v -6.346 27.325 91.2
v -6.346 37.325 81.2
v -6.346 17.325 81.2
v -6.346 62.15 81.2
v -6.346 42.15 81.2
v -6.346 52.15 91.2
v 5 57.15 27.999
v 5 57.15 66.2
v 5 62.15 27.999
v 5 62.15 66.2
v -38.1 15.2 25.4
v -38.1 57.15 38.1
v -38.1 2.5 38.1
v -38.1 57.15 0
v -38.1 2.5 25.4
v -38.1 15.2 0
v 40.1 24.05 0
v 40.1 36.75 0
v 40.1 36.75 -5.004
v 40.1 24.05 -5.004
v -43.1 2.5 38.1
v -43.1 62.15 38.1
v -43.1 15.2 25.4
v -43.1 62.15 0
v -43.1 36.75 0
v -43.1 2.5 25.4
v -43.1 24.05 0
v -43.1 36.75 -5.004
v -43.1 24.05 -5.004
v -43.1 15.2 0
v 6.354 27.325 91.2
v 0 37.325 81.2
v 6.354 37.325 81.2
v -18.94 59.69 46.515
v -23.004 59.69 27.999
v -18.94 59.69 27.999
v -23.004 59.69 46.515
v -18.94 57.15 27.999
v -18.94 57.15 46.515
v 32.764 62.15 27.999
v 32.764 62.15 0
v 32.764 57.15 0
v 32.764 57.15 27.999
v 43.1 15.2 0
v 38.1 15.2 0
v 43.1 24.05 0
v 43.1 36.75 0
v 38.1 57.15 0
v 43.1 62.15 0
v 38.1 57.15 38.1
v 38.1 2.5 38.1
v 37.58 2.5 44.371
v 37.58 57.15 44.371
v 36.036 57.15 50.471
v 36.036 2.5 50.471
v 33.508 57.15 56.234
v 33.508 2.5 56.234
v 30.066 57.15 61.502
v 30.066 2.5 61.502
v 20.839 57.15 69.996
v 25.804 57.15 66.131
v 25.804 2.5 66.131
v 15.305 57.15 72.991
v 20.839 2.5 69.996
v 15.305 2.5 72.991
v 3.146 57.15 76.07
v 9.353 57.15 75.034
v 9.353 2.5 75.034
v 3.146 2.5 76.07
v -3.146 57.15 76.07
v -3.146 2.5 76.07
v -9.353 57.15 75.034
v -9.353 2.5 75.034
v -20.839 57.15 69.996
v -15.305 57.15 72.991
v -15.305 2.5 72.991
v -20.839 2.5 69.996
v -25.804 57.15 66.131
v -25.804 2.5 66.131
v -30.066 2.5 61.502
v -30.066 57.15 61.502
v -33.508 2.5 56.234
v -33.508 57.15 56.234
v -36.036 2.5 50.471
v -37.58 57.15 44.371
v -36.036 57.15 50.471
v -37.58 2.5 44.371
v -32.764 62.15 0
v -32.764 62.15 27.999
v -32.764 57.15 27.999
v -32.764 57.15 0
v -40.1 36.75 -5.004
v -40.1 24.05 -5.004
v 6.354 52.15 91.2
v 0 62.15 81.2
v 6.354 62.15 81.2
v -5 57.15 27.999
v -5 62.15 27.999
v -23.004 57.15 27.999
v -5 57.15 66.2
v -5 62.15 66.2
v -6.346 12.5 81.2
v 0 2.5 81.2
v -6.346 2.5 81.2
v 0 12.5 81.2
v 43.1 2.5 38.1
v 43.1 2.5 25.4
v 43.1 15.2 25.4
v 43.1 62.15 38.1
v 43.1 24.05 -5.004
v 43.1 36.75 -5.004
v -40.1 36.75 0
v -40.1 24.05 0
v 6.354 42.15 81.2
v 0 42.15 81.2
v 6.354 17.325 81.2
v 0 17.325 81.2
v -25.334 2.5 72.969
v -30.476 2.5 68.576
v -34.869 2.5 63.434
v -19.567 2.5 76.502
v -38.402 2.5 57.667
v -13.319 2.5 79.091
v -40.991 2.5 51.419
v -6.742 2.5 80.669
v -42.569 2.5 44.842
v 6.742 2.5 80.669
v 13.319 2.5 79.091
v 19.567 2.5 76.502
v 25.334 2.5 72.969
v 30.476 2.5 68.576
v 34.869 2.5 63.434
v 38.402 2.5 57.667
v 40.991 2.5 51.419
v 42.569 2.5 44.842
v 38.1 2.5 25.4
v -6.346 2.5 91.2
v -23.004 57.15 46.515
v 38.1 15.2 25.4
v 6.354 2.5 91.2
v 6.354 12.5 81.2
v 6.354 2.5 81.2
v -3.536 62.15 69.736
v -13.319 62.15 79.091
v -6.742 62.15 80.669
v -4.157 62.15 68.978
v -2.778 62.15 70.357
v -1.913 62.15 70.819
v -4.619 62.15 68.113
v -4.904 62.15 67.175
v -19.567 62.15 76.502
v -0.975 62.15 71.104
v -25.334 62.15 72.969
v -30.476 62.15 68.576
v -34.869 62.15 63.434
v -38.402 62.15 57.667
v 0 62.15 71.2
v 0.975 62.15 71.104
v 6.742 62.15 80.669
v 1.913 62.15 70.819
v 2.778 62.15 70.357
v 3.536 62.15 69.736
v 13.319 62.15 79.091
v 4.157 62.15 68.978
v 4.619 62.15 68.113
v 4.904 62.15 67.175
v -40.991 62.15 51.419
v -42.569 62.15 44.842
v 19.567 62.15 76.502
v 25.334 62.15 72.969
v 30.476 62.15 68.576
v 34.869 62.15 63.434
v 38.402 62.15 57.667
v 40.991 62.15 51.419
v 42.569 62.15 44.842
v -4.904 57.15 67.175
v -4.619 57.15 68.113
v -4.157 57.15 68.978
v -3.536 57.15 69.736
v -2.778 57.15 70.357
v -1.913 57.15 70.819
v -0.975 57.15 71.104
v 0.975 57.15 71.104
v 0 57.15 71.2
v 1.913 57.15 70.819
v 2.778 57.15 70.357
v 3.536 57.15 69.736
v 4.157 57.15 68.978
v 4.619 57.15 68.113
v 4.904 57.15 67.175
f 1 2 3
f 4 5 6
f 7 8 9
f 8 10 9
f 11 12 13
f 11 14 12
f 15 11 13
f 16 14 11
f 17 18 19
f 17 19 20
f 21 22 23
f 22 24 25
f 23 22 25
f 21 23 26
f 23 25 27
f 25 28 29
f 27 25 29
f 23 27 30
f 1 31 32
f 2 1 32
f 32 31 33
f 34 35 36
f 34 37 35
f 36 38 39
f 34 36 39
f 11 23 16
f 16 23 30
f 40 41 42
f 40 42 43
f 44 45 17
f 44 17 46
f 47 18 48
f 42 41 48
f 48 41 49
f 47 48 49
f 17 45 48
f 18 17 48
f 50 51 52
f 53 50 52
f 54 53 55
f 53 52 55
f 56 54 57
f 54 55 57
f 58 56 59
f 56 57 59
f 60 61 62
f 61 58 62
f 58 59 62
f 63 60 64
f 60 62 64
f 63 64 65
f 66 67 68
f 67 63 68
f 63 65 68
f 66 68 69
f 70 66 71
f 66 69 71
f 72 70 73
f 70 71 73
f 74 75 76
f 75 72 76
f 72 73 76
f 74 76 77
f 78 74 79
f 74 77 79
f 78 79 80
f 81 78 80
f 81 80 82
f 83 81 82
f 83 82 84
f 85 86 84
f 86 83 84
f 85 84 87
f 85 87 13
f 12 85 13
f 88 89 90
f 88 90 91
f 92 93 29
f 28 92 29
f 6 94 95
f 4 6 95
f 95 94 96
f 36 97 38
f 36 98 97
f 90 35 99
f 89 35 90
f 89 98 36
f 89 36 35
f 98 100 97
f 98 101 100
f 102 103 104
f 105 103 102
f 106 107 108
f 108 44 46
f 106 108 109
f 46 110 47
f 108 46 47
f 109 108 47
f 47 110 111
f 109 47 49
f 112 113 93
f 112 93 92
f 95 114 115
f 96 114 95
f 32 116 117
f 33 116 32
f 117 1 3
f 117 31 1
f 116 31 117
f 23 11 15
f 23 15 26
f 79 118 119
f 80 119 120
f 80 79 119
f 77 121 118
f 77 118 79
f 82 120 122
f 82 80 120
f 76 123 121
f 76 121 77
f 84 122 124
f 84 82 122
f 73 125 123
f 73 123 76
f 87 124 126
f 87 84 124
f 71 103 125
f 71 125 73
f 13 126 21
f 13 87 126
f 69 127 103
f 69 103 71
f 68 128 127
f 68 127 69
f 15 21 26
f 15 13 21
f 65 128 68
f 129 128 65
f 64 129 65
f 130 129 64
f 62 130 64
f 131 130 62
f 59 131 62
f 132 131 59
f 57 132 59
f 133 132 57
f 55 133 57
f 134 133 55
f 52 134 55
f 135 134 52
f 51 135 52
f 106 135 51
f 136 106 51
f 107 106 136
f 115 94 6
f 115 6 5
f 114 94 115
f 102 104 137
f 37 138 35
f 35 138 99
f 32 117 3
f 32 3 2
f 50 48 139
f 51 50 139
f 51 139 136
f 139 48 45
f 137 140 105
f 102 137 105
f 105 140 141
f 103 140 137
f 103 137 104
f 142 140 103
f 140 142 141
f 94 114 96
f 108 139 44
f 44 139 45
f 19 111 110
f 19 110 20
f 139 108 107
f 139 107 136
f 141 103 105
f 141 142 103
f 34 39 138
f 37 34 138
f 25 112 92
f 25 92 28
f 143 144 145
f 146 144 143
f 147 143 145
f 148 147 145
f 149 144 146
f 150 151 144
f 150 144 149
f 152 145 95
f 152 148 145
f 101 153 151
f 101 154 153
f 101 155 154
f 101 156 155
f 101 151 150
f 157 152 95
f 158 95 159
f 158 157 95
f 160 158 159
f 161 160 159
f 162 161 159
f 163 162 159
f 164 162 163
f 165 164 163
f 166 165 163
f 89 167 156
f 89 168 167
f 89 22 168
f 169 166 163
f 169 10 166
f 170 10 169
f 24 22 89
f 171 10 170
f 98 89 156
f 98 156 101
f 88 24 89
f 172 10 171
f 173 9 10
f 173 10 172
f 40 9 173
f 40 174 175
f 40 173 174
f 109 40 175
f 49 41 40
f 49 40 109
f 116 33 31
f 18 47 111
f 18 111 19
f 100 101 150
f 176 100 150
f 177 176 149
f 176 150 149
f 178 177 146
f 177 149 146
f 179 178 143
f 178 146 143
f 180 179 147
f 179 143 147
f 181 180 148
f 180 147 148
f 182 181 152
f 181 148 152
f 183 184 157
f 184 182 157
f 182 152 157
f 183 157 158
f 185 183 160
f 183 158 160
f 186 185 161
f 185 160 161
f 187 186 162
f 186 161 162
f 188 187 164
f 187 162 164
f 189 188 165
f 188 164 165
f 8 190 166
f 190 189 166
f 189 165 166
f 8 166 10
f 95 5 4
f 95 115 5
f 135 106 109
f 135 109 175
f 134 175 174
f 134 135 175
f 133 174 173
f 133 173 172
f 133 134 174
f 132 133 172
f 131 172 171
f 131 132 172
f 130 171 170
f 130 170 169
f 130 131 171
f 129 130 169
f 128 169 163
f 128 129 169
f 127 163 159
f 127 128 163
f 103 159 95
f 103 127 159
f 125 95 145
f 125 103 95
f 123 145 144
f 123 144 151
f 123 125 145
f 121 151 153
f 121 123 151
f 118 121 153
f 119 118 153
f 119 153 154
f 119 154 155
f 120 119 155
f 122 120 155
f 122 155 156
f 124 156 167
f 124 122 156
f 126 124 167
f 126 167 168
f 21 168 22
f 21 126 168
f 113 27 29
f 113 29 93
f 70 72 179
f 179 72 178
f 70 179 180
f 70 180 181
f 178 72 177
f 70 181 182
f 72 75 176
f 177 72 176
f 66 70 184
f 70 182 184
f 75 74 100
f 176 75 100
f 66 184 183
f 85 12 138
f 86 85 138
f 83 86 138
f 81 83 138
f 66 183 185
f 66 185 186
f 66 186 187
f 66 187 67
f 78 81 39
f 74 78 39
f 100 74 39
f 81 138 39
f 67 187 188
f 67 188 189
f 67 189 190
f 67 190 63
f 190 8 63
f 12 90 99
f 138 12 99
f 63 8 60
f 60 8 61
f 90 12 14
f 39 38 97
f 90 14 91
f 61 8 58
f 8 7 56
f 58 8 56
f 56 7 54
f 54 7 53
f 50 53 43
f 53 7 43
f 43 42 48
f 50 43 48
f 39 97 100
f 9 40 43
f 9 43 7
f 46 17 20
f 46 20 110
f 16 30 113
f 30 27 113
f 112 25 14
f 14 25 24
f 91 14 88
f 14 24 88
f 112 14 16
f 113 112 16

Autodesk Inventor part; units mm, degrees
ref_plane "YZ Plane" through (0, 0, 0) normal (1, 0, 0) x (0, 1, 0)
ref_plane "XZ Plane" through (0, 0, 0) normal (0, 1, 0) x (-1, 0, 0)
sketch "Sketch1" plane through (0, 0, 0) normal (0, 0, 1) x (1, 0, 0)
  arc A0 (-38.1, -57.15) -> (38.1, -57.15) centre (0, -57.15) ccw projected
  line L0 (38.1, -57.15) -> (43.1, -57.15) projected
  line L1 (43.1, -57.15) -> (43.1, 62.15) projected
  line L2 (43.1, 62.15) -> (-43.1, 62.15) projected
  line L3 (-43.1, 62.15) -> (-43.1, -57.15) projected
  line L4 (-43.1, -57.15) -> (-38.1, -57.15) projected
  line L5 (14, 57.15) -> (-14, 57.15) projected
  line L6 (14, 57.15) -> (14, 54.15) projected
  line L7 (14, 54.15) -> (-10.002, 54.15) projected
  line L8 (-10.002, 54.15) -> (-10.002, 53.078) projected
  line L9 (-10.002, 53.078) -> (-14, 53.078) projected
  line L10 (-14, 53.078) -> (-14, 57.15) projected
  line L11 (10.16, -7.55) -> (-10.16, -7.55) projected
  line L12 (-10.16, -7.55) -> (-10.16, 9.15) projected
  line L13 (-10.16, 9.15) -> (10.16, 9.15) projected
  line L14 (10.16, 9.15) -> (10.16, -7.55) projected
  circle A1 centre (0, -77.15) radius 5 projected
  line L15 (-19.058, -20.782) -> (-19.058, -16.21) projected
  line L16 (-19.058, -16.21) -> (-17.058, -16.21) projected
  line L17 (-17.058, -16.21) -> (-17.058, -22.782) projected
  line L18 (-17.058, -22.782) -> (-24.598, -22.782) projected
  line L19 (-24.598, -22.782) -> (-24.598, -16.21) projected
  line L20 (-24.598, -16.21) -> (-22.598, -16.21) projected
  line L21 (-22.598, -16.21) -> (-22.598, -20.782) projected
  line L22 (-22.598, -20.782) -> (-19.058, -20.782) projected
  line L23 (-19.058, 7.65) -> (-19.058, 12.222) projected
  line L24 (-19.058, 12.222) -> (-22.598, 12.222) projected
  line L25 (-22.598, 12.222) -> (-22.598, 7.65) projected
  line L26 (-22.598, 7.65) -> (-24.598, 7.65) projected
  line L27 (-24.598, 7.65) -> (-24.598, 14.222) projected
  line L28 (-24.598, 14.222) -> (-17.058, 14.222) projected
  line L29 (-17.058, 14.222) -> (-17.058, 7.65) projected
  line L30 (-17.058, 7.65) -> (-19.058, 7.65) projected
  line L31 (-6.662, 29.218) -> (-6.662, 22.4) projected
  line L32 (-6.662, 22.4) -> (7.275, 22.4) projected
  line L33 (7.275, 22.4) -> (7.275, 19.4) projected
  line L34 (7.275, 19.4) -> (-14.202, 19.4) projected
  line L35 (-14.202, 19.4) -> (-14.202, 29.218) projected
  line L36 (-14.202, 29.218) -> (-12.202, 29.218) projected
  line L37 (-12.202, 29.218) -> (-12.202, 29.221) projected
  line L38 (-12.202, 29.221) -> (-8.662, 29.221) projected
  line L39 (-8.662, 29.221) -> (-8.662, 29.218) projected
  line L40 (-8.662, 29.218) -> (-6.662, 29.218) projected
  line L41 (38.1, -57.15) -> (43.1, -57.15)
  line L42 (43.1, -57.15) -> (43.1, 62.15)
  line L43 (43.1, 62.15) -> (38.1, 62.15)
  line L44 (38.1, 62.15) -> (38.1, -57.15)
  line L45 (-38.1, -57.15) -> (-43.1, -57.15)
  line L46 (-43.1, -57.15) -> (-43.1, 62.15)
  line L47 (-43.1, 62.15) -> (-38.1, 62.15)
  line L48 (-38.1, 62.15) -> (-38.1, -57.15)
  line L49 (-43.1, 62.15) -> (-43.1, 57.15)
  line L50 (-43.1, 57.15) -> (43.1, 57.15)
  line L51 (43.1, 57.15) -> (-43.1, 57.15)
  line L52 (-43.1, 57.15) -> (-43.1, 62.15)
  line L53 (-43.1, 62.15) -> (43.1, 62.15)
  line L54 (43.1, 62.15) -> (43.1, 57.15)
  point P0 (0, 0)
  dimension "d0" = 5
extrude "Extrusion1" add sketch "Sketch1" along normal blind 38.1 contours L4 L3 L50 L48 | L44 L50 L1 L0 | L50 L3 L2 L48 | L48 L2 L44 L50 L5 | L44 L2 L1 L50
sketch "Sketch2" plane through (-43.1, -57.15, 0) normal (0, -1, 0) x (1, 0, 0)
  line L0 (5, 38.1) -> (81.2, 38.1) projected
  arc A0 (81.2, 38.1) -> (5, 38.1) centre (43.1, 38.1) ccw
  line L1 (0, 38.1) -> (5, 38.1) projected
  arc A1 (86.2, 38.1) -> (0, 38.1) centre (43.1, 38.1) ccw
  line L2 (0, 38.1) -> (5, 38.1)
  line L3 (81.2, 38.1) -> (86.2, 38.1) projected
  line L4 (81.2, 38.1) -> (86.2, 38.1)
  point P0 (43.1, 0)
extrude "Extrusion2" add sketch "Sketch2" against normal blind 119.3 contours L1 A1 L3 A0
sketch "Sketch3" plane through (-43.1, 62.15, 0) normal (0, 1, 0) x (1, 0, 0)
  arc A0 (5, -38.1) -> (81.2, -38.1) centre (43.1, -38.1) ccw projected
  line L0 (81.2, -38.1) -> (5, -38.1) projected
  point P0 (43.1, 0)
extrude "Extrusion3" add sketch "Sketch3" against normal blind 5
sketch "Sketch4" plane through (-43.1, 62.15, 0) normal (0, 1, 0) x (1, 0, 0)
  circle A0 centre (43.1, -23.375) radius 3.275 projected
  point P0 (43.1, 0)
extrude "Extrusion4" cut sketch "Sketch4" against normal blind 5
ref_plane "Work Plane1" through (0.0038, -57.15, 0) normal (-1, 0, 0) x (0, 0, 1)
sketch "Sketch5" plane through (0.0038, -57.15, 0) normal (-1, 0, 0) x (0, 0, 1)
  point P0 (0, 57.15)
sketch "Sketch6" plane through (0.0038, -57.15, 0) normal (-1, 0, 0) x (0, 0, 1)
  line L0 (81.2, 0) -> (81.2, 119.3) projected
  line L1 (81.2, 119.3) -> (81.2, 99.3)
  line L2 (81.2, 109.3) -> (91.2, 109.3)
  line L3 (91.2, 109.3) -> (81.2, 119.3)
  line L4 (91.2, 109.3) -> (81.2, 99.3)
  line L5 (91.2, 84.475) -> (81.2, 74.475)
  line L6 (81.2, 84.475) -> (91.2, 84.475)
  line L7 (81.2, 94.475) -> (81.2, 74.475)
  line L8 (91.2, 84.475) -> (81.2, 94.475)
  line L9 (91.2, 59.65) -> (81.2, 49.65)
  line L10 (81.2, 59.65) -> (91.2, 59.65)
  line L11 (81.2, 69.65) -> (81.2, 49.65)
  line L12 (91.2, 59.65) -> (81.2, 69.65)
  line L13 (91.2, 34.825) -> (81.2, 24.825)
  line L14 (81.2, 34.825) -> (91.2, 34.825)
  line L15 (81.2, 44.825) -> (81.2, 24.825)
  line L16 (91.2, 34.825) -> (81.2, 44.825)
  line L17 (91.2, 10) -> (81.2, 0)
  line L18 (81.2, 10) -> (91.2, 10)
  line L19 (81.2, 20) -> (81.2, 0)
  line L20 (91.2, 10) -> (81.2, 20)
  point P0 (0, 57.15)
  dimension "d10" = 20
  dimension "d11" = 10
  dimension "d14" = 24.825
extrude "Extrusion5" add sketch "Sketch6" along normal mid plane 12.7
sketch "Sketch8" plane through (0, 0, 0) normal (0, 0, -1) x (-1, 0, 0)
  line L0 (40.1, 24.05) -> (40.1, 36.75) projected
  line L1 (40.1, -31.75) -> (40.1, -19.05) projected
  line L2 (-40.1, 36.75) -> (-40.1, 24.05) projected
  line L3 (-40.1, -19.05) -> (-40.1, -31.75) projected
  line L4 (43.1, 62.15) -> (43.1, -57.15) projected
  line L5 (40.1, 36.75) -> (43.1, 36.75)
  line L6 (43.1, 36.75) -> (43.1, 24.05)
  line L7 (43.1, 24.05) -> (40.1, 24.05)
  line L8 (40.1, 24.05) -> (40.1, 36.75)
  line L9 (40.1, -19.05) -> (43.1, -19.05)
  line L10 (43.1, -19.05) -> (43.1, -31.75)
  line L11 (43.1, -31.75) -> (40.1, -31.75)
  line L12 (40.1, -31.75) -> (40.1, -19.05)
  line L13 (-43.1, -57.15) -> (-43.1, 62.15) projected
  line L14 (-40.1, -19.05) -> (-43.1, -19.05)
  line L15 (-43.1, -19.05) -> (-43.1, -31.75)
  line L16 (-43.1, -31.75) -> (-40.1, -31.75)
  line L17 (-40.1, -31.75) -> (-40.1, -19.05)
  line L18 (-40.1, 24.05) -> (-43.1, 24.05)
  line L19 (-43.1, 24.05) -> (-43.1, 36.75)
  line L20 (-43.1, 36.75) -> (-40.1, 36.75)
  line L21 (-40.1, 36.75) -> (-40.1, 24.05)
  point P0 (0, 0)
extrude "Extrusion6" add sketch "Sketch8" along normal blind 5.0038
sketch "Sketch9" plane through (43.1, -57.15, 38.1) normal (1, 0, 0) x (0, 0, -1)
  line L0 (-53.1, 59.65) -> (-43.1, 69.65) projected
  line L1 (-53.1, 59.65) -> (78.849, 59.65)
  line L2 (78.849, 59.65) -> (83.1956, -43.5453)
  line L3 (83.1956, -43.5453) -> (-80.8871, -47.5296)
  line L4 (-80.8871, -47.5296) -> (-53.1, 59.65)
  point P0 (38.1, 57.15)
extrude "Extrusion7" cut sketch "Sketch9" against normal blind 2540
sketch "Sketch10" plane through (-43.1, 62.15, 0) normal (-1, 0, 0) x (0, 0, 1)
  line L0 (38.1, -59.65) -> (0, -59.65) projected
  line L1 (38.1, -59.65) -> (38.1, 0) projected
  line L2 (0, -59.65) -> (38.1, -59.65)
  line L3 (38.1, -59.65) -> (38.1, -46.95)
  line L4 (38.1, -46.95) -> (0, -46.95)
  line L5 (0, -46.95) -> (0, -59.65)
  point P0 (0, -62.15)
  dimension "d25" = 12.7
extrude "Extrusion8" cut sketch "Sketch10" against normal blind 1422.4
sketch "Sketch11" plane through (-43.1, 62.15, 0) normal (0, 1, 0) x (1, 0, 0)
  arc A0 (5, -38.1) -> (81.2, -38.1) centre (43.1, -38.1) ccw projected
  line L0 (43.1, -76.2) -> (43.1, -66.2)
  circle A1 centre (43.1, -66.2) radius 5
  point P0 (43.1, 0)
  dimension "d28" = 10
  dimension "d29" = 10
extrude "Extrusion9" cut sketch "Sketch11" against normal blind 1422.4
sketch "Sketch12" plane through (-43.1, 62.15, 0) normal (0, 1, 0) x (1, 0, 0)
  circle A0 centre (43.1, -66.2) radius 5 projected
  line L0 (38.1, -66.2) -> (38.1, 0)
  line L1 (38.1, 0) -> (48.1, 0)
  line L2 (5, 0) -> (81.2, 0) projected
  line L3 (48.1, -66.2) -> (48.1, 0)
  circle A1 centre (43.1, -66.2) radius 5
  point P0 (43.1, 0)
extrude "Extrusion10" cut sketch "Sketch12" against normal blind 25.4
sketch "Sketch13" plane through (-43.1, 62.15, 38.1) normal (0, 1, 0) x (1, 0, 0)
  line L0 (12.3362, 12.101) -> (12.3362, 25.69) projected
  line L1 (15.3207, 25.69) -> (12.3362, 25.69) projected
  line L2 (15.3207, 25.69) -> (15.3207, 15.53) projected
  line L3 (15.3207, 15.53) -> (19.1307, 15.53) projected
  line L4 (19.1307, 15.53) -> (19.1307, 25.69) projected
  line L5 (22.1152, 25.69) -> (19.1307, 25.69) projected
  line L6 (22.1152, 12.101) -> (22.1152, 25.69) projected
  line L7 (22.1152, 12.101) -> (12.3362, 12.101) projected
  line L8 (12.3362, 12.101) -> (12.3362, 10.101)
  line L9 (12.3362, 10.101) -> (10.3362, 10.101)
  line L10 (22.1152, 25.69) -> (22.1152, 27.69)
  line L11 (22.1152, 27.69) -> (24.1152, 27.69)
  line L12 (24.1152, 27.69) -> (10.3362, 27.69)
  line L13 (10.3362, 27.69) -> (10.3362, 10.101)
  line L14 (10.3362, 10.101) -> (24.1152, 10.101)
  line L15 (24.1152, 10.101) -> (24.1152, 27.69)
  point P0 (43.1, 38.1)
  dimension "d34" = 2
  dimension "d35" = 2
  dimension "d36" = 2
  dimension "d37" = 2
extrude "Extrusion11" cut sketch "Sketch13" against normal blind 25.4
sketch "Sketch14" plane through (0, 57.15, 38.1) normal (0, -1, 0) x (1, 0, 0)
  line L0 (-18.9401, 8.415) -> (-23.0041, 8.415)
  line L1 (-23.0041, 8.415) -> (-23.0041, -15.715) projected
  line L2 (-18.9401, -15.715) -> (-18.9401, 8.415) projected
  line L3 (-18.9401, -15.715) -> (-23.0041, -15.715)
  point P0 (0, -38.1)
extrude "Extrusion12" cut sketch "Sketch14" against normal blind 2.54
sketch "Sketch15" plane through (43.1, 15.2, 38.1) normal (0, 0, -1) x (-1, 0, 0)
  line L0 (5, 0) -> (5, -12.7) projected
  line L1 (5, 0) -> (0, 0) projected
  line L2 (0, -12.7) -> (0, 0) projected
  line L3 (5, -12.7) -> (0, -12.7) projected
  line L4 (81.2, -12.7) -> (81.2, 0) projected
  line L5 (86.2, -12.7) -> (81.2, -12.7) projected
  line L6 (86.2, 0) -> (86.2, -12.7) projected
  line L7 (86.2, 0) -> (81.2, 0) projected
  point P0 (43.1, -15.2)
extrude "Extrusion13" add sketch "Sketch15" along normal blind 12.7
sketch "Sketch16" plane through (-43.1, 62.15, 38.1) normal (0, 1, 0) x (1, 0, 0)
  line L0 (10.3362, 10.101) -> (20.0959, 10.101) projected
  line L1 (24.1152, 27.69) -> (24.1152, 10.101) projected
  line L2 (10.3362, 10.101) -> (24.1152, 10.101)
  line L3 (24.1152, 10.101) -> (24.1152, 27.69)
  line L4 (24.1152, 27.69) -> (10.3362, 27.69)
  line L5 (10.3362, 27.69) -> (10.3362, 10.101)
  line L6 (43.1, 38.1) -> (43.1, 27.69)
  line L7 (75.8638, 10.101) -> (66.1041, 10.101)
  line L8 (62.0848, 27.69) -> (62.0848, 10.101)
  line L9 (75.8638, 10.101) -> (62.0848, 10.101)
  line L10 (62.0848, 10.101) -> (62.0848, 27.69)
  line L11 (62.0848, 27.69) -> (75.8638, 27.69)
  line L12 (75.8638, 27.69) -> (75.8638, 10.101)
  line L13 (38.1, 38.1) -> (0, 38.1) projected
  line L14 (75.8638, 10.101) -> (10.3362, 10.101)
  line L15 (10.3362, 10.101) -> (10.3362, 38.1)
  line L16 (10.3362, 38.1) -> (75.8638, 38.1)
  line L17 (75.8638, 38.1) -> (75.8638, 10.101)
extrude "Extrusion14" cut sketch "Sketch16" against normal blind 12.7 contours L15 L13 L16 L17 L11 L8 L14 L1 L4 | L8 L11 L12 L7 L9
properties part number "Skin1"
